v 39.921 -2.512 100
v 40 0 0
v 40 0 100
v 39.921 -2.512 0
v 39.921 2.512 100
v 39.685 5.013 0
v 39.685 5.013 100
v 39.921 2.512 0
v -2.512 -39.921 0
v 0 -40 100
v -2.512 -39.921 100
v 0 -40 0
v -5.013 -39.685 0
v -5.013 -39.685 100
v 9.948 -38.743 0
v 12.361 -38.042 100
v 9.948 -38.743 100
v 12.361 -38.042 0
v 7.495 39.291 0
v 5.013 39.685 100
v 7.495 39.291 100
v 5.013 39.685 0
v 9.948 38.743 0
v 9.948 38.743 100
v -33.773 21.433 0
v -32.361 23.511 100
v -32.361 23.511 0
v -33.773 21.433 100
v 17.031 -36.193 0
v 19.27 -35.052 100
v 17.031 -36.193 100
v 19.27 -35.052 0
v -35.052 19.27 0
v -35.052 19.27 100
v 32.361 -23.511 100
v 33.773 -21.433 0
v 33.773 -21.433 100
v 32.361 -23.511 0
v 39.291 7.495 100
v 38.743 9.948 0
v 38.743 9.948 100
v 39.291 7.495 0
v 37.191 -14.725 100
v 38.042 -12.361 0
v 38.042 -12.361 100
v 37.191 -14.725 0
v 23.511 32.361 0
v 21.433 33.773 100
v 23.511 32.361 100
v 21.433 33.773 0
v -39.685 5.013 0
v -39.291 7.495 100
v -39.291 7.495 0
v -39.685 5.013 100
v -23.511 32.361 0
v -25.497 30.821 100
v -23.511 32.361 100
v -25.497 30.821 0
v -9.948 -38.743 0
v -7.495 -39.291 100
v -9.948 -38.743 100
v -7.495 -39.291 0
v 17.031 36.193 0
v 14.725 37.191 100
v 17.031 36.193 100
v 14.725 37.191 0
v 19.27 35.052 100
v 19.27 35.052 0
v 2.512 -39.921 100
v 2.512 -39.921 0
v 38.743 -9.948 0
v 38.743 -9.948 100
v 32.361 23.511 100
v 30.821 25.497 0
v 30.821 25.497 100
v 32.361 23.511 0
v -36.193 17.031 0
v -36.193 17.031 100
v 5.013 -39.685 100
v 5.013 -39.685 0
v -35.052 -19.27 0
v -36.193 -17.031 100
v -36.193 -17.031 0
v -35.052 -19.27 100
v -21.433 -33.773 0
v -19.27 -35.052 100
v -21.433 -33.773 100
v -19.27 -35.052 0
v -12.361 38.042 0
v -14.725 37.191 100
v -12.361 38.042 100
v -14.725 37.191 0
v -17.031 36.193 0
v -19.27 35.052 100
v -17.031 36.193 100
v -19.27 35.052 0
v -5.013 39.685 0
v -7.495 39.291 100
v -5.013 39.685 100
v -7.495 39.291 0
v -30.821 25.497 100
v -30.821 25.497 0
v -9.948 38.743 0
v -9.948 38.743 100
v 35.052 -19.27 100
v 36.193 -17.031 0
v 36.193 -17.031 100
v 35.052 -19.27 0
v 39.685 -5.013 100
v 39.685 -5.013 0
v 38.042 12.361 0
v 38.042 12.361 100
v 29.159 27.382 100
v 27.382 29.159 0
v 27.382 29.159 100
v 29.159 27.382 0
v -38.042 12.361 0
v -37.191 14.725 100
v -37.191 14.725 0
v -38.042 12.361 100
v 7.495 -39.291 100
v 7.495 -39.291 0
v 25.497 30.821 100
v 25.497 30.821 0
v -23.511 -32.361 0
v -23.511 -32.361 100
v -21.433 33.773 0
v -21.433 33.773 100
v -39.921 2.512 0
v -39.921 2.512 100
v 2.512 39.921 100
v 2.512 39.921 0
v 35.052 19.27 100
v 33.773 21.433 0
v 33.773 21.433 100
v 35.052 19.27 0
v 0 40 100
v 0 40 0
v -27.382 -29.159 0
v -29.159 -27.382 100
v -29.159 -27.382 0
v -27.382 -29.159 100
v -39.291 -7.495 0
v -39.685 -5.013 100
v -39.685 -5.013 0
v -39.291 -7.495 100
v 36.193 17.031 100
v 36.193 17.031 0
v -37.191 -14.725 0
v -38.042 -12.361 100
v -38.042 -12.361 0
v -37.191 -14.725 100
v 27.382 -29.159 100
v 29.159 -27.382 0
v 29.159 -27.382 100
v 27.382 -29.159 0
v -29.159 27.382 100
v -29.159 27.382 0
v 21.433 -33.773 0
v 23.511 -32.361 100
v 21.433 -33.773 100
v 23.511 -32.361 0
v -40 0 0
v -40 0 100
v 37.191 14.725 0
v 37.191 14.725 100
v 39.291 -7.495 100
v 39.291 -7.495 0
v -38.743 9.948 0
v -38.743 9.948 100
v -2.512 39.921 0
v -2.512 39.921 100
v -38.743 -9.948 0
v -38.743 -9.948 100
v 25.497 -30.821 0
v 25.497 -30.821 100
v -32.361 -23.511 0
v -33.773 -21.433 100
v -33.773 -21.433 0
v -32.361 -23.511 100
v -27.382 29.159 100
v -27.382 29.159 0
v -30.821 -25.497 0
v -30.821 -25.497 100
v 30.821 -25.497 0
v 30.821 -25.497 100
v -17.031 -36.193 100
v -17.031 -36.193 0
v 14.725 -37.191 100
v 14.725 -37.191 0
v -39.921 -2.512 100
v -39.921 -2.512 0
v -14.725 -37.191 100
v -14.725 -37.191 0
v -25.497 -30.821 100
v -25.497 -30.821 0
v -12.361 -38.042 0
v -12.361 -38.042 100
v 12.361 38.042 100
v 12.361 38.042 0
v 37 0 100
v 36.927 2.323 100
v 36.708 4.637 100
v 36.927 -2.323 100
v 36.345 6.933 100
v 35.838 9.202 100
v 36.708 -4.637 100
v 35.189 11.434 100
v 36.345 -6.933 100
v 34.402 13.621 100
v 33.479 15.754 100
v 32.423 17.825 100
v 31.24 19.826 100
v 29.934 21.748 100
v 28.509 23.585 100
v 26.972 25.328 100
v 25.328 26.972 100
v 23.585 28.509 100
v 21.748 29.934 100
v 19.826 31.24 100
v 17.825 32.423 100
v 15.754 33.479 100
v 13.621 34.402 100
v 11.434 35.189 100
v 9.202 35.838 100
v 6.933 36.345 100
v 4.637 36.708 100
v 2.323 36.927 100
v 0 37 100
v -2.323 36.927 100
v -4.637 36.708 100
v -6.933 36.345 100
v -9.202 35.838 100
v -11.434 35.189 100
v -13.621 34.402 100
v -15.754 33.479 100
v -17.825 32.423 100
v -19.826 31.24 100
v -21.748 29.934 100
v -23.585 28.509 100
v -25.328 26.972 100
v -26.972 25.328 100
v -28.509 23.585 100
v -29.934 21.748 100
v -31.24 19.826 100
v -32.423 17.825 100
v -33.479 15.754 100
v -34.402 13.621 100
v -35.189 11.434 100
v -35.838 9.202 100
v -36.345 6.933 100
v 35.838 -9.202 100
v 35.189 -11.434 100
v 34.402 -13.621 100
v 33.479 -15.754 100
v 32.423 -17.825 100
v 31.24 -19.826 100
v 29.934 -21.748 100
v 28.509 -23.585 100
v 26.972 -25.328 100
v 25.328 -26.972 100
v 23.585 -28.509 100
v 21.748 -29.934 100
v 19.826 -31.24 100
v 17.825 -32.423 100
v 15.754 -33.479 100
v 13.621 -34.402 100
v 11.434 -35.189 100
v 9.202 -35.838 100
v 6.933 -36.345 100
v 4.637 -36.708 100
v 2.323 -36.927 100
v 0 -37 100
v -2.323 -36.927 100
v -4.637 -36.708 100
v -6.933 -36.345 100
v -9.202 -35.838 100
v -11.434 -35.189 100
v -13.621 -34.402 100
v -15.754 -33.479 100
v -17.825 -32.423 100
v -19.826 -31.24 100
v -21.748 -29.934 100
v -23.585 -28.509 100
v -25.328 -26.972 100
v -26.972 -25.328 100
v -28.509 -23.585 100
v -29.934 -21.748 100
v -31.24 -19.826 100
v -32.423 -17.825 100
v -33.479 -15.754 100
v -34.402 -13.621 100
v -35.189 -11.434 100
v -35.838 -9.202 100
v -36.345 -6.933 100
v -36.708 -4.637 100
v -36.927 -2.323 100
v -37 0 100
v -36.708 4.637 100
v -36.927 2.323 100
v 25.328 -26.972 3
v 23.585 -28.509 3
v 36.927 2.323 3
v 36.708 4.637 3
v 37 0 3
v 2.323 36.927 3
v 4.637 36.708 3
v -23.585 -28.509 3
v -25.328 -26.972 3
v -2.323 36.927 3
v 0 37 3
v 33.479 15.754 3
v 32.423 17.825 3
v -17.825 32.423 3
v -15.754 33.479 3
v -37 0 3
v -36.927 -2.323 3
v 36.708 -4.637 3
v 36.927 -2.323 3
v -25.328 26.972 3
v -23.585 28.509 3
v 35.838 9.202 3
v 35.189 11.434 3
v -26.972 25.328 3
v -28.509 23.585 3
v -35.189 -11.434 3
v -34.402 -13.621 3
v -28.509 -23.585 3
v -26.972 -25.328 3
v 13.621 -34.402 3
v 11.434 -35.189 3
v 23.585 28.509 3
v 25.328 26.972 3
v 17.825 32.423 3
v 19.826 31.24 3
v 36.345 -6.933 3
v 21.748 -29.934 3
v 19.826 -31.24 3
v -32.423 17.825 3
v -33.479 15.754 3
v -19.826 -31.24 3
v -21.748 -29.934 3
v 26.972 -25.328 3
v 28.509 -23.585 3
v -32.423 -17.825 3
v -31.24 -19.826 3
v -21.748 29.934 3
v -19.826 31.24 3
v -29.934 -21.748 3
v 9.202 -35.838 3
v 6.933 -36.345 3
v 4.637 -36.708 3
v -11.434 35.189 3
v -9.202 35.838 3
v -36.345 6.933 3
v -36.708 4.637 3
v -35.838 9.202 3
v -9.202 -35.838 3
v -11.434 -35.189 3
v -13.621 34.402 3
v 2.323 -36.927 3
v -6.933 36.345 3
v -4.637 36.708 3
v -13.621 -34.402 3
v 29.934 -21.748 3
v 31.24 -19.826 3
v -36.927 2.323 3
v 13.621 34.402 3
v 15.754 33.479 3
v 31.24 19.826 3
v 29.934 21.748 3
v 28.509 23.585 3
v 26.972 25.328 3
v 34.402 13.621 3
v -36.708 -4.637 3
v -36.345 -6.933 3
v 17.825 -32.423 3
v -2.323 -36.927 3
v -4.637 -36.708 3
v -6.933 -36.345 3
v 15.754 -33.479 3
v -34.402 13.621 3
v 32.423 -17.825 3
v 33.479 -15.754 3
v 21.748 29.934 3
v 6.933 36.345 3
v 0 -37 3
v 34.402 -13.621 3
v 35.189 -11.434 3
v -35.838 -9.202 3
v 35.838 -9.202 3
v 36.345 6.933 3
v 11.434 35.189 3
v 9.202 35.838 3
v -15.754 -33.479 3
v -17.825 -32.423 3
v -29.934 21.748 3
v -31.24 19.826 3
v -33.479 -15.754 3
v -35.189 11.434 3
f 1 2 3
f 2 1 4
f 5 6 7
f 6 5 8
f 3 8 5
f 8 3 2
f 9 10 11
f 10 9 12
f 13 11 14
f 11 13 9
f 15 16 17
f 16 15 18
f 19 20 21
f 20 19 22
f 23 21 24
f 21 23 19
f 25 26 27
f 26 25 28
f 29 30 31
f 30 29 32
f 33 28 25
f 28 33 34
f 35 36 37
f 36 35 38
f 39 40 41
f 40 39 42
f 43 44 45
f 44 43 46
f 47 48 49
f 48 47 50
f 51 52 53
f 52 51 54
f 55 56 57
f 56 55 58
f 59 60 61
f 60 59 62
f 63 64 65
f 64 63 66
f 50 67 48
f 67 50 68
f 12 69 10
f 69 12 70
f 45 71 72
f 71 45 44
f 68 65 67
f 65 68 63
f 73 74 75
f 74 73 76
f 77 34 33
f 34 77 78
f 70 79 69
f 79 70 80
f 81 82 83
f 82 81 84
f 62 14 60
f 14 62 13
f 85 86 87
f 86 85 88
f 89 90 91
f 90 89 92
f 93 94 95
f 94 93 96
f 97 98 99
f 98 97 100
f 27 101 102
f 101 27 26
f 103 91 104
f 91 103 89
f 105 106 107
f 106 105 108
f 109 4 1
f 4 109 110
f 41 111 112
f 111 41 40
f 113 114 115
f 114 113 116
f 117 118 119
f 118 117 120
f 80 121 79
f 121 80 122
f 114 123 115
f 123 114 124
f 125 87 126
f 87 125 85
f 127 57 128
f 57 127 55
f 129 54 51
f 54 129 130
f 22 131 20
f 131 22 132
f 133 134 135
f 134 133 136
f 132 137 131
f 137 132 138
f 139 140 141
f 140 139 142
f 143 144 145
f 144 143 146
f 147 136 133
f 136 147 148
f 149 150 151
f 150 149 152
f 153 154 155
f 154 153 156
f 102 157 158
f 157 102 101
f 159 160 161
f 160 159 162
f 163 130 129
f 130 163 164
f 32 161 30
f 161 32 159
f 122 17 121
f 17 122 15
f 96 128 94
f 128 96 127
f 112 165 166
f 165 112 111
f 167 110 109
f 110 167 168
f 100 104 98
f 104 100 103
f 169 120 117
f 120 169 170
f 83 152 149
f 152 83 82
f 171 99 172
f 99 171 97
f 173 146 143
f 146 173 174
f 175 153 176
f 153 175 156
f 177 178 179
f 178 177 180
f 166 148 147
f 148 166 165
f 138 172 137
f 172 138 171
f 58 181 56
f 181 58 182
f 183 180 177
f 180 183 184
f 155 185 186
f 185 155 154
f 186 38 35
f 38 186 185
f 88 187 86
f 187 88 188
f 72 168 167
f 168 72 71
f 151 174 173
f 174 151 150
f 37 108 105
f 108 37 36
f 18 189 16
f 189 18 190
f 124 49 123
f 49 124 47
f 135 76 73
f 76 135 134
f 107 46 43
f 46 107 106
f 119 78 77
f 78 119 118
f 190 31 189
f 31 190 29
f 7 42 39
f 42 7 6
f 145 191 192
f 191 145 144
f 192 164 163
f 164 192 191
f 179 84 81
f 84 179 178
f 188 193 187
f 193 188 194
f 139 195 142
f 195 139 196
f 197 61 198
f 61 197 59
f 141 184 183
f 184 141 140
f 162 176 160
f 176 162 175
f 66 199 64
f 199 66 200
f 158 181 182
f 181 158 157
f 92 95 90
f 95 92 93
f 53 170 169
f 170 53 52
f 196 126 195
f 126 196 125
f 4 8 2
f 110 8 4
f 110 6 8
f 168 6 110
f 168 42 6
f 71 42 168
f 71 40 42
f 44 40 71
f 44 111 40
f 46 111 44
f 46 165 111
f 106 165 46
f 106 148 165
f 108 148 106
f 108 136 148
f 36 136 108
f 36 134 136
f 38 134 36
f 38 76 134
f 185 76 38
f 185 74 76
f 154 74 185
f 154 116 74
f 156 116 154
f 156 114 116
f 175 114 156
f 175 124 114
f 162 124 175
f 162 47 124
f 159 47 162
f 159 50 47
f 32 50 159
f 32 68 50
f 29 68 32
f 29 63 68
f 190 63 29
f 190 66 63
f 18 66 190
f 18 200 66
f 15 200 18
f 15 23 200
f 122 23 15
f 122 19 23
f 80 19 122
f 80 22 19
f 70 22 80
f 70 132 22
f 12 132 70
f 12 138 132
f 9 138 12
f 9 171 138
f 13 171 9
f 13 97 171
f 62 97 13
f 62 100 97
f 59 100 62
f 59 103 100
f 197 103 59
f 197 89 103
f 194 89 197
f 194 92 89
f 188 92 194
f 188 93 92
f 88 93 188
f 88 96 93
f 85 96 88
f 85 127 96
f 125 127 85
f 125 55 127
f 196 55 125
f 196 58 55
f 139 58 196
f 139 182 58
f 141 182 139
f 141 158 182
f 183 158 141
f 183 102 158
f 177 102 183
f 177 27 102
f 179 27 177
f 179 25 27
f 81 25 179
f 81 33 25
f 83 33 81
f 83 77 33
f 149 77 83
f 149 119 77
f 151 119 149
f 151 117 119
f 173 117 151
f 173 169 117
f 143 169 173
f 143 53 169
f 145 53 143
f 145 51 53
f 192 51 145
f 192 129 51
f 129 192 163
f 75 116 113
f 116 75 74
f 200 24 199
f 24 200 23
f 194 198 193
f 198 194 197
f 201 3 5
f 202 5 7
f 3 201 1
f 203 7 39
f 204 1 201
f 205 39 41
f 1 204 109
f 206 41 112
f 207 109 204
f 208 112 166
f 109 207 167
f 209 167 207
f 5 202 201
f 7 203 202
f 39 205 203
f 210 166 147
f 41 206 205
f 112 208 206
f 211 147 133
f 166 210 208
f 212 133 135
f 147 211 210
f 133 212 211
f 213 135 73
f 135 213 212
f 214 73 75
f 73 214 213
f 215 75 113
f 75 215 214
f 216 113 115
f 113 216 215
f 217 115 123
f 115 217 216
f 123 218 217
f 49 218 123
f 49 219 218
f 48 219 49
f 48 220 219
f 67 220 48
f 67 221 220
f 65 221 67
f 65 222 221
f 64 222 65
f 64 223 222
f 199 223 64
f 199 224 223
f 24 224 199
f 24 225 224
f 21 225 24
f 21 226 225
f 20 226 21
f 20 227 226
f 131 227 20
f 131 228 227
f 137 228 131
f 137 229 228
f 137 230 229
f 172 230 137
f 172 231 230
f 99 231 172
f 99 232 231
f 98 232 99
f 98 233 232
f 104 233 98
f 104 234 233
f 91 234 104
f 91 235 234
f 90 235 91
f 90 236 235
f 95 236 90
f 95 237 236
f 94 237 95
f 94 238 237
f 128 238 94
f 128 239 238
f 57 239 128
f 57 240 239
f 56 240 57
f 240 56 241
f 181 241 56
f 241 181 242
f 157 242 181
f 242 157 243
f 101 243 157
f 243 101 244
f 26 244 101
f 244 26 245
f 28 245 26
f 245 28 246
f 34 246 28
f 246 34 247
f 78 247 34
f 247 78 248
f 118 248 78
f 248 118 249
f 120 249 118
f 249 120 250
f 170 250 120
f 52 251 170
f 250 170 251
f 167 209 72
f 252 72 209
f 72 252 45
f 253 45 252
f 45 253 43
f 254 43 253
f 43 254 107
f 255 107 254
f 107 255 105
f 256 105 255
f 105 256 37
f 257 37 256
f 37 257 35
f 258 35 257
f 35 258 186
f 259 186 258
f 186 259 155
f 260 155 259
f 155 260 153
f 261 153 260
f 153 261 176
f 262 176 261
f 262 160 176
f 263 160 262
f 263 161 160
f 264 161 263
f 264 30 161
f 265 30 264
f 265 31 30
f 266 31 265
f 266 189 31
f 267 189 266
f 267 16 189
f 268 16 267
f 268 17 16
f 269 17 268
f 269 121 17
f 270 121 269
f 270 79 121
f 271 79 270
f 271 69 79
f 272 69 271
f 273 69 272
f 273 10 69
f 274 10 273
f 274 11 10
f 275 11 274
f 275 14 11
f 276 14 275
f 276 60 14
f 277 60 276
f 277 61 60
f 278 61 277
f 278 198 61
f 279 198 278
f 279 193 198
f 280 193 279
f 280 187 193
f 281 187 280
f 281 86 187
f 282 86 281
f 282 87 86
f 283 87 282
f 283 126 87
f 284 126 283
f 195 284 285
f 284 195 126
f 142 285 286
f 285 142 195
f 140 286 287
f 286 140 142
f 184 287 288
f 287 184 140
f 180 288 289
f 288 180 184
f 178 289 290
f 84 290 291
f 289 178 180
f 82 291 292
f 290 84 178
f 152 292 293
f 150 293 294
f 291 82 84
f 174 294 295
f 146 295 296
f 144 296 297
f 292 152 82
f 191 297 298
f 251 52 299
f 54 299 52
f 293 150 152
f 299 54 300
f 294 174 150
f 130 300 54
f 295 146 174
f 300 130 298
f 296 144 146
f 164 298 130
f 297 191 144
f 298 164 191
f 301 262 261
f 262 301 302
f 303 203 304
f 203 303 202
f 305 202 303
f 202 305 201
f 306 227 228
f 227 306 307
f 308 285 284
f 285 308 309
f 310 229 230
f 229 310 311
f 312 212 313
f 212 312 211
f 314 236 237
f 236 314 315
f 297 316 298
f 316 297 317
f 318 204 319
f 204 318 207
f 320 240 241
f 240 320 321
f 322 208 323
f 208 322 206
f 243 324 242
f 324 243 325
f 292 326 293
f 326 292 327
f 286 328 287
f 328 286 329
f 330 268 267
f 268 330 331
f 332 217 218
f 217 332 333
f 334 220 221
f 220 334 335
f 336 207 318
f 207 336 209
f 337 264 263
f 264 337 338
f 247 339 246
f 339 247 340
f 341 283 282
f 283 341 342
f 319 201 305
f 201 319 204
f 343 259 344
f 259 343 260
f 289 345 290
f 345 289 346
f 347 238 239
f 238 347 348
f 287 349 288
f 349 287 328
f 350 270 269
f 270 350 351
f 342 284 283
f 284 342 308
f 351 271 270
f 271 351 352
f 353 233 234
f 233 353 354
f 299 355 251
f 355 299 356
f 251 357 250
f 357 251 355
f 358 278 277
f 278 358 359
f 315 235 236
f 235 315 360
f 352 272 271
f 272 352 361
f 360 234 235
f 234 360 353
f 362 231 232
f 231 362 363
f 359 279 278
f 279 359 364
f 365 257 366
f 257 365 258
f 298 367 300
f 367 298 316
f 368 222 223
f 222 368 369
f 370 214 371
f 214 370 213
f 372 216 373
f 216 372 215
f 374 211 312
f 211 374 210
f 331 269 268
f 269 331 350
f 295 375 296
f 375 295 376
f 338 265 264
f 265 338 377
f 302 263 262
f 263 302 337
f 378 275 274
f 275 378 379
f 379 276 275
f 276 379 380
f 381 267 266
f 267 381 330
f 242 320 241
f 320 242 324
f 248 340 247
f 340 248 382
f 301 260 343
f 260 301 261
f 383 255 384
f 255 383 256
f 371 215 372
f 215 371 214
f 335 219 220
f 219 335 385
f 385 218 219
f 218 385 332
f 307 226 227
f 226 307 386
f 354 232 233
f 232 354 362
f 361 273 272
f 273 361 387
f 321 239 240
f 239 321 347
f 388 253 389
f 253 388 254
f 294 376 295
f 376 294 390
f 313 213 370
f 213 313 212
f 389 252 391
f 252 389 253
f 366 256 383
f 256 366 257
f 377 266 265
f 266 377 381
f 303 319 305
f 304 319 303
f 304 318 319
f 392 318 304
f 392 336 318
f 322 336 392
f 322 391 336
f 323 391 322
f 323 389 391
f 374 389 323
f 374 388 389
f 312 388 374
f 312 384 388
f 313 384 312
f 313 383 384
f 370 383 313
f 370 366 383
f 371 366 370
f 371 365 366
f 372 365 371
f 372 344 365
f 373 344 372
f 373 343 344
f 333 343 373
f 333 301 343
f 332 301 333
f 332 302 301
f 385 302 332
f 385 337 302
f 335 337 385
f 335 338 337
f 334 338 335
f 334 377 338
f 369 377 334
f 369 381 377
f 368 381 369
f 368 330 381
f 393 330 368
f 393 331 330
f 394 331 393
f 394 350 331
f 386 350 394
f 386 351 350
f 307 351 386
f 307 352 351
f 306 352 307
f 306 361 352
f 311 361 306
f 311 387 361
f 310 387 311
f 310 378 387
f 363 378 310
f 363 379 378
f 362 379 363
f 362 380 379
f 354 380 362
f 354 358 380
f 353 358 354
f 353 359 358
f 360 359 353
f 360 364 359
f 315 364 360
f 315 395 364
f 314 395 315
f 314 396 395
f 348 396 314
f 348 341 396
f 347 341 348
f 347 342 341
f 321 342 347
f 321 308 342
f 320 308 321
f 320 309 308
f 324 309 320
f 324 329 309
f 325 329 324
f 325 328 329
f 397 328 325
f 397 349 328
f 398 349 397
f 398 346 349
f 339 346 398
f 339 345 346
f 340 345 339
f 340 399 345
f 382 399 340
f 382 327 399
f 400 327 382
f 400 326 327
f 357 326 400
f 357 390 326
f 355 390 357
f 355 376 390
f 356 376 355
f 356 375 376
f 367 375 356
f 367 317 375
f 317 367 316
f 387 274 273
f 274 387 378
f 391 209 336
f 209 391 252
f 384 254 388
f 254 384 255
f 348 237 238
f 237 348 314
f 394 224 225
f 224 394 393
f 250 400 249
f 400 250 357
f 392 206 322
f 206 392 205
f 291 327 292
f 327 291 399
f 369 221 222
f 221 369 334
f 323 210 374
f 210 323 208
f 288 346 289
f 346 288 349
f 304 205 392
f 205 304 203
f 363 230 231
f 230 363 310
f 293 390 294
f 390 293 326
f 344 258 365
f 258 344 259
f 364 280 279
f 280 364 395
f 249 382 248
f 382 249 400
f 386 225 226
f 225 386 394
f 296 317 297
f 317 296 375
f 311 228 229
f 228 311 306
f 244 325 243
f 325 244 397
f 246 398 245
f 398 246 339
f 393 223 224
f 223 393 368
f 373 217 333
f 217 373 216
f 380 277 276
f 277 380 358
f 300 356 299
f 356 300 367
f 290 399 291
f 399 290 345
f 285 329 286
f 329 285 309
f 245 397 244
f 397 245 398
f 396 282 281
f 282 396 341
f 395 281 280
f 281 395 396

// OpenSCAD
// Não usar BOSL2
// Projeto porta lápis parametricos

// Dimenssões do porta lápis redondo

diameter = 80;

height = 100;

lid_thickness = 3;

$fn = 100;
difference() {
    cylinder(h = height, d = diameter);
    translate([0, 0, lid_thickness])
        cylinder(h = height + 2, d = diameter - 2 * lid_thickness);
}
